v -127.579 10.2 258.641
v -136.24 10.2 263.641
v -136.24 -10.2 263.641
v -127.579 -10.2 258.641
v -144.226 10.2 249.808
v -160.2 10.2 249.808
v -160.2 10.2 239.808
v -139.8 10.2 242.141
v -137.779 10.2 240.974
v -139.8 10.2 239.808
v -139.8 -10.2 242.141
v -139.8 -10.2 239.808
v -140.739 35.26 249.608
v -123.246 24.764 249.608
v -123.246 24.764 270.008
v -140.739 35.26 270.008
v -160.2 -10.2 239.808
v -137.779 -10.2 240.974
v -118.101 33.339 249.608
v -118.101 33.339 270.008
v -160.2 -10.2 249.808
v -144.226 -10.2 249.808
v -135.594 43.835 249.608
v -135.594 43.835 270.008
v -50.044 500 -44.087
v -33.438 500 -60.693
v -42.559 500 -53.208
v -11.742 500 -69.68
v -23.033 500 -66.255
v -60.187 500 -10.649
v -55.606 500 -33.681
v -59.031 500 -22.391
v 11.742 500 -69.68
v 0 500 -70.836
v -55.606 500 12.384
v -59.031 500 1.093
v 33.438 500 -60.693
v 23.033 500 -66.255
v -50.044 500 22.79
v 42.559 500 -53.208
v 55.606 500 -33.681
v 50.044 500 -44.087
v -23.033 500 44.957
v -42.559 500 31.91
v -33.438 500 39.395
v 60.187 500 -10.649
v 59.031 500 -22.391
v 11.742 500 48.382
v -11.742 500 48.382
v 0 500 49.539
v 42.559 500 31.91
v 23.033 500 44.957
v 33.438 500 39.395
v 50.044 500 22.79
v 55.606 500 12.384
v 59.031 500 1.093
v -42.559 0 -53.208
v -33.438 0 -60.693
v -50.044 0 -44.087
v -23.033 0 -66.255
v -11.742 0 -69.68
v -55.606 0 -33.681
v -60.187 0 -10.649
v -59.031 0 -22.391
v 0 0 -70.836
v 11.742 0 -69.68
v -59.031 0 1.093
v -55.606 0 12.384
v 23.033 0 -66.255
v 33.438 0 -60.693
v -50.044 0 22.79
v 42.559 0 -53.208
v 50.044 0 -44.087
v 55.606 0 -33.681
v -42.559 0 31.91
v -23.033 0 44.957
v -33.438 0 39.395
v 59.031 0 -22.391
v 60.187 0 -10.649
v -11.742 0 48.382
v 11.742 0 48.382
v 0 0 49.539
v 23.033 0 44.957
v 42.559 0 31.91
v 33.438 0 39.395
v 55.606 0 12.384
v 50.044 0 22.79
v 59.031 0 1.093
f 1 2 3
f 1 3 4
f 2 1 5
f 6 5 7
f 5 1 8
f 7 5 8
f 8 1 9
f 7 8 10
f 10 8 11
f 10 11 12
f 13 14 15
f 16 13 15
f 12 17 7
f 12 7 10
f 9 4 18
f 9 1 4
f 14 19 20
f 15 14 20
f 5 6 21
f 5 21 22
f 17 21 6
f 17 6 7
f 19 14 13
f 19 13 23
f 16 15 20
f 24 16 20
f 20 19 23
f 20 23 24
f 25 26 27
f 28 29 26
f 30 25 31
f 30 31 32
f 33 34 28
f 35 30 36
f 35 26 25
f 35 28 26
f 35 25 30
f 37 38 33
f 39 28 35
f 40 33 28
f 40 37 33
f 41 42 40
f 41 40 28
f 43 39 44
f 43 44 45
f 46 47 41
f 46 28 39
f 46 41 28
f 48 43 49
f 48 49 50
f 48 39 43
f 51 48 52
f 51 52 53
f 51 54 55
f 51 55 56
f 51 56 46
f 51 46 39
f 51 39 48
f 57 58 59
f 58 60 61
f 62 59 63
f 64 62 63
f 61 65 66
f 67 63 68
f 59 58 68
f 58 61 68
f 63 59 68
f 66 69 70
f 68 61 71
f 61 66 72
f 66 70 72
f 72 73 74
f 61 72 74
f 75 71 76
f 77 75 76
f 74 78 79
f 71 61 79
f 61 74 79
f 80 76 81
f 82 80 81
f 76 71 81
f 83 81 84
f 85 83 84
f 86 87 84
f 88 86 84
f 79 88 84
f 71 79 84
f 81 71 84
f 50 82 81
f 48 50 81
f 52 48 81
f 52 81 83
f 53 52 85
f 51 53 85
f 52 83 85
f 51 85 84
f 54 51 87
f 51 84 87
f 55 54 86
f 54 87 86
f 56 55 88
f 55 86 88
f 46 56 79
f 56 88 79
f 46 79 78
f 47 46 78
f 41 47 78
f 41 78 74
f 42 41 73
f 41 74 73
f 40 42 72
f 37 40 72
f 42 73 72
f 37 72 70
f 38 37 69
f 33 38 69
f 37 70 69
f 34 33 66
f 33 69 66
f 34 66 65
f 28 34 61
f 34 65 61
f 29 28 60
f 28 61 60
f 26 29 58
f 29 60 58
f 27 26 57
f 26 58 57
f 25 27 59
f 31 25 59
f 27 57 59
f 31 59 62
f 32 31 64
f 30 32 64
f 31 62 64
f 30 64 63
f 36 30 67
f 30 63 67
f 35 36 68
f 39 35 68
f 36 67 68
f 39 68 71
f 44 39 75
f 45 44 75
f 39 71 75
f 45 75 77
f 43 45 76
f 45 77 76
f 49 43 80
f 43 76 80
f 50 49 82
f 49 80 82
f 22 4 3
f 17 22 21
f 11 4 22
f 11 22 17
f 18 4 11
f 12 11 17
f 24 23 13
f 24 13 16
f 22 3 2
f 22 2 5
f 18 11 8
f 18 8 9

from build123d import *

# Parameters (mm, degrees)
CROQUIS4_R              = 60.187347707
SALIENTE_EXTRUIR1_DEPTH = 500
CROQUIS5_W              = 20.4
CROQUIS5_H              = 10
SALIENTE_EXTRUIR2_DEPTH = 10.2
CROQUIS8_W              = 20.4
CROQUIS8_H              = 10
SALIENTE_EXTRUIR4_DEPTH = 10.2


with BuildPart() as part:
    # Croquis4 → Saliente-Extruir1 (new body)
    with BuildSketch(Plane(origin=(0, 0, 0), x_dir=(1, 0, 0), z_dir=(0, 1, 0))):
        with Locations(Location((0, 10.648786568, 0), (0, 0, 270))):
            Circle(CROQUIS4_R)
    extrude(amount=SALIENTE_EXTRUIR1_DEPTH)


with BuildPart() as body_2:
    # Croquis5 → Saliente-Extruir2 (new, symmetric)
    with BuildSketch(Plane(origin=(0, 0, 0), x_dir=(1, 0, 0), z_dir=(0, 1, 0))):
        with Locations((-150, -244.807621135)):
            Rectangle(CROQUIS5_W, CROQUIS5_H)
    saliente_extruir2 = extrude(amount=SALIENTE_EXTRUIR2_DEPTH, both=True)

    # Simetría5: Saliente-Extruir2 across plane
    add(saliente_extruir2.mirror(Plane(origin=(0, 0, 0), x_dir=(-0.49999999999999983, 0, 0.8660254037844387), z_dir=(0.8660254037844386, 0, 0.4999999999999999))))


with BuildPart() as body_3:
    # Croquis8 → Saliente-Extruir4 (new, symmetric)
    with BuildSketch(Plane(origin=(-110.294117647, 66.176470588, 0), x_dir=(0, 0, 1), z_dir=(-0.8574929257125441, 0.5144957554275266, 0))):
        with Locations((259.807621135, -37.174363314)):
            Rectangle(CROQUIS8_W, CROQUIS8_H)
    extrude(amount=SALIENTE_EXTRUIR4_DEPTH, both=True)


solid = Compound([part.part, body_2.part, body_3.part])
